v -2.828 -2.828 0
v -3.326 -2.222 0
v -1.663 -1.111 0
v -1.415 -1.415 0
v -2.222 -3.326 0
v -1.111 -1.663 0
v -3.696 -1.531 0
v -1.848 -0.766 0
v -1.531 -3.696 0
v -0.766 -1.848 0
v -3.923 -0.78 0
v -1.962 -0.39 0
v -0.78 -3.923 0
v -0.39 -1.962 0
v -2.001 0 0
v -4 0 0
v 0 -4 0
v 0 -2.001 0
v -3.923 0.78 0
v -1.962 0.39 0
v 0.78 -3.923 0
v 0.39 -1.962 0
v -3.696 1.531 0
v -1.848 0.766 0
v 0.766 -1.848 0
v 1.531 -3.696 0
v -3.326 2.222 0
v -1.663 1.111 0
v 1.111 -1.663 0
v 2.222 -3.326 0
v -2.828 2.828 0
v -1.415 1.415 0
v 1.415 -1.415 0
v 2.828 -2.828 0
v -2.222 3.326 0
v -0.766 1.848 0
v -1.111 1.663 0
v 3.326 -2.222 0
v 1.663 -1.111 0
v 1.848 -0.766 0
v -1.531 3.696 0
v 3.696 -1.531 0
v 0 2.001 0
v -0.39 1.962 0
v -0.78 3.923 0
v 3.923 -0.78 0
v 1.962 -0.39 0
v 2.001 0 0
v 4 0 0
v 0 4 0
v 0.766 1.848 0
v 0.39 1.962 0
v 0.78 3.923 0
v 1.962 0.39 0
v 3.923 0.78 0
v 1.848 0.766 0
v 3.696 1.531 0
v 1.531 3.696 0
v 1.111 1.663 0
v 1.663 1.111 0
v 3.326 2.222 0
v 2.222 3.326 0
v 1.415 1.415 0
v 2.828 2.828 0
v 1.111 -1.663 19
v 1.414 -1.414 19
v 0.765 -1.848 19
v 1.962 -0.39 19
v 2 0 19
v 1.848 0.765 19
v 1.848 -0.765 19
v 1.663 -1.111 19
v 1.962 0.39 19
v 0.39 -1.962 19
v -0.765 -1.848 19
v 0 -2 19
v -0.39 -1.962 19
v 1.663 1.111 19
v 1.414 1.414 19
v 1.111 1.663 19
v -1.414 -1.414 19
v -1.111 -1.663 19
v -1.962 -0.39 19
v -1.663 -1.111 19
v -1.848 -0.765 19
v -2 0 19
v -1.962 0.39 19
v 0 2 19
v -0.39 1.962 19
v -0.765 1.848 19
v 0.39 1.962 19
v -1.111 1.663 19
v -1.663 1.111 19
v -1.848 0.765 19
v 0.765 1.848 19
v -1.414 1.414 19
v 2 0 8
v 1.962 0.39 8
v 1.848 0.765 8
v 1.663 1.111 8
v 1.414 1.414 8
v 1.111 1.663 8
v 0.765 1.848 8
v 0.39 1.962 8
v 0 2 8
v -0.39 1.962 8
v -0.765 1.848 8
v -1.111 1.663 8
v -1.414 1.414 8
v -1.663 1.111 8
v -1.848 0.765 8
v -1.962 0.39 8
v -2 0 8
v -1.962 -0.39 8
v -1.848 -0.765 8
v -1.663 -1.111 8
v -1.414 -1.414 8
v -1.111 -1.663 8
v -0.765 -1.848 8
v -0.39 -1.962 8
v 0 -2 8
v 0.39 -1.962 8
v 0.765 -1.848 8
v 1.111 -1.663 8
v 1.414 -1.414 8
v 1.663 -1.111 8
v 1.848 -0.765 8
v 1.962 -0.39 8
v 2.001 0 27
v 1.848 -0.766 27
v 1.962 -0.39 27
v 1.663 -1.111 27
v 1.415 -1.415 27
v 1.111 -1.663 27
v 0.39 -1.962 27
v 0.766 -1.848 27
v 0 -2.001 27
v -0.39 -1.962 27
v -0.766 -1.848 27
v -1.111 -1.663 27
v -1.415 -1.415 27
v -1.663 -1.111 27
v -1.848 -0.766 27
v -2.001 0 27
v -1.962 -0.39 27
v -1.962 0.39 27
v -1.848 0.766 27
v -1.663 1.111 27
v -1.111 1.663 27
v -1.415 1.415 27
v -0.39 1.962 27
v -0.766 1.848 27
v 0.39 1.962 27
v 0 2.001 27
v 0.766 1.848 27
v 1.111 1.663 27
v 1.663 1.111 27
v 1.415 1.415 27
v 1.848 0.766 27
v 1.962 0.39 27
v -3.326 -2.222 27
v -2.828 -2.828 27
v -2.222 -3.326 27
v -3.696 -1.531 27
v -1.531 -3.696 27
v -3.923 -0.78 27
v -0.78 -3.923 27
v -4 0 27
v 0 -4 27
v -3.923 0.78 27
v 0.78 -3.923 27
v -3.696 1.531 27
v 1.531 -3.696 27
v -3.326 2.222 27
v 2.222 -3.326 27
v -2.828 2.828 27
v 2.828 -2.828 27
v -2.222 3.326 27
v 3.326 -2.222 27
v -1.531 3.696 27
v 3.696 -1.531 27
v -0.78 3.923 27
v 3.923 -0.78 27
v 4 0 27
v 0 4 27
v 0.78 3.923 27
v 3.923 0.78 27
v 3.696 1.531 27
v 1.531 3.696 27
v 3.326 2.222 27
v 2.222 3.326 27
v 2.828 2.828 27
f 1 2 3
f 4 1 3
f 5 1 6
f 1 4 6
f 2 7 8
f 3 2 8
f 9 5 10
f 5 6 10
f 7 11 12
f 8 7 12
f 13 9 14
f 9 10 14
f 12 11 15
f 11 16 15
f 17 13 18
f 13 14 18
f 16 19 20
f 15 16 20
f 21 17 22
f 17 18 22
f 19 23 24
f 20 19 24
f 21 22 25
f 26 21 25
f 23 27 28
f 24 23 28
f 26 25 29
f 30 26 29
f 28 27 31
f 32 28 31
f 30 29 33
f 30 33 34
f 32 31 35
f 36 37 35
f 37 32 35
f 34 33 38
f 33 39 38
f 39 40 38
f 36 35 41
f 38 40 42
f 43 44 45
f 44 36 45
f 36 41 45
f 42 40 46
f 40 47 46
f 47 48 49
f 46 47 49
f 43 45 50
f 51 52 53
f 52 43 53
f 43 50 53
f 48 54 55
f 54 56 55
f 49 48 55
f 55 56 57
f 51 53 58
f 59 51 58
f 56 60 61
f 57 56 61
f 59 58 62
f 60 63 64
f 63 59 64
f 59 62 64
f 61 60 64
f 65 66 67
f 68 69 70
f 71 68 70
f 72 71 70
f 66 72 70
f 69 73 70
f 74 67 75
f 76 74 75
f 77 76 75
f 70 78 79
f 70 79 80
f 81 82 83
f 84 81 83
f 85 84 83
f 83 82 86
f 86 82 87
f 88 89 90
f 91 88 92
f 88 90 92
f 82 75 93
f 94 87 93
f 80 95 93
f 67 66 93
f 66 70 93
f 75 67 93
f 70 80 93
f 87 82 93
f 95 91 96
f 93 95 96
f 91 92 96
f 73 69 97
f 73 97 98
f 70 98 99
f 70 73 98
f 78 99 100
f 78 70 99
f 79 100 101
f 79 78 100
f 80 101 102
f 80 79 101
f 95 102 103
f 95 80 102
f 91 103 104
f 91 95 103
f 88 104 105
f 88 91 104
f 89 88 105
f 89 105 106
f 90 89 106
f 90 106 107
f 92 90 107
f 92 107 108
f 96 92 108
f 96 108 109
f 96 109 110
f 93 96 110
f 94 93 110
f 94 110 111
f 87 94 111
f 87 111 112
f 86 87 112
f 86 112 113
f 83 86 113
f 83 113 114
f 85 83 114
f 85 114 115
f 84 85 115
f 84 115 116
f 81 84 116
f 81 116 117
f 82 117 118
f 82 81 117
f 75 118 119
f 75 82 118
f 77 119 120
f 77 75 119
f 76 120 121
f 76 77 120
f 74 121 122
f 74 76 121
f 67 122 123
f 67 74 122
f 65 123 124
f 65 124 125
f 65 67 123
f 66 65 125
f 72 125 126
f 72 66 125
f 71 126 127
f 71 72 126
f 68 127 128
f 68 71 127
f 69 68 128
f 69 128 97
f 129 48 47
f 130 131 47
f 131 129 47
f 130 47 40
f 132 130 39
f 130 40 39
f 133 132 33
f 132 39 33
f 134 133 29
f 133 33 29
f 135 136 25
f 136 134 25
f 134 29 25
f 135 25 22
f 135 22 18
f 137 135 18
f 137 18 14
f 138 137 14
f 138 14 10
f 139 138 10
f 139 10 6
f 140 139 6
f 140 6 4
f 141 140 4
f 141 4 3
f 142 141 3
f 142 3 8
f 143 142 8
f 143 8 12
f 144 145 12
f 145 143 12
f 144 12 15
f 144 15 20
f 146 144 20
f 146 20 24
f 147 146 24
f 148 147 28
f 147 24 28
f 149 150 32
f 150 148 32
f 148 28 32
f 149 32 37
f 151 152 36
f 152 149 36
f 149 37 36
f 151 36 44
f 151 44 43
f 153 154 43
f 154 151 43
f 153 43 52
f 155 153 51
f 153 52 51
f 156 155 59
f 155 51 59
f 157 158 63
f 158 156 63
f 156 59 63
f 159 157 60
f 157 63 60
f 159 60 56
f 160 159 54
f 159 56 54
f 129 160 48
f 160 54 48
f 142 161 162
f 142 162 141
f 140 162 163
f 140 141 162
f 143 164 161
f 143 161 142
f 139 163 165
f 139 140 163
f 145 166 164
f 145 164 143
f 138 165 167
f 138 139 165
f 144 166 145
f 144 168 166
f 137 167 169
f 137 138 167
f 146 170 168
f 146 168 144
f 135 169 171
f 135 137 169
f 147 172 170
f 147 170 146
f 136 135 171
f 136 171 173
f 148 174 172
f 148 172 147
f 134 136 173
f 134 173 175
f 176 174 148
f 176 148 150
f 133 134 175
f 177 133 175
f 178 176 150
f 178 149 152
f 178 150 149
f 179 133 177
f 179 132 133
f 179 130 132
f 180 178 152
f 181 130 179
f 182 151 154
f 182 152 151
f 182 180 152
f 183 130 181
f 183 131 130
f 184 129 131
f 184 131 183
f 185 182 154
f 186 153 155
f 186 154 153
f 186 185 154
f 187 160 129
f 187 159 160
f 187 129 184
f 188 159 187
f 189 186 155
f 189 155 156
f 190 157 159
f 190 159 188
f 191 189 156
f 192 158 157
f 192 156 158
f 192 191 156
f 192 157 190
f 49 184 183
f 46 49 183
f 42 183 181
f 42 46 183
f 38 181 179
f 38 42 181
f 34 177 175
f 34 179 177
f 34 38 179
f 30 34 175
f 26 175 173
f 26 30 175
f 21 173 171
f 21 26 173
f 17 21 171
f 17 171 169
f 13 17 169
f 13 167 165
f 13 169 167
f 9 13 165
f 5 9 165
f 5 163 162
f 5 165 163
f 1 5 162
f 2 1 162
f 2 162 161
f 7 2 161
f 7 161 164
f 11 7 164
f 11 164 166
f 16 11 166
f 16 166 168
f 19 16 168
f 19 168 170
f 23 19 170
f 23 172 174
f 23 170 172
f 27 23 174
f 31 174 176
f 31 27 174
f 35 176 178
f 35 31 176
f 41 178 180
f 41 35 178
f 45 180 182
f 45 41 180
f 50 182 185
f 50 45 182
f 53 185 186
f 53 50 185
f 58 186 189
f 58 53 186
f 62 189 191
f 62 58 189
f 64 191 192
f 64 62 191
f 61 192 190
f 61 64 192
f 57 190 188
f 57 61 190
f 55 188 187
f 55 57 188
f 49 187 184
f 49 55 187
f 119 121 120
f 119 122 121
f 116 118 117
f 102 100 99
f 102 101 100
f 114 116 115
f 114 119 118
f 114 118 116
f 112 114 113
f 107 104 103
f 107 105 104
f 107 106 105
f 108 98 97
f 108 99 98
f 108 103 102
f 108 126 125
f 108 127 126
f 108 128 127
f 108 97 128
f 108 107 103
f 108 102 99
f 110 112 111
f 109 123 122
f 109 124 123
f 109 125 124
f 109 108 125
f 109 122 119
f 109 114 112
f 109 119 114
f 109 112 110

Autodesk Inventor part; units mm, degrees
ref_plane "YZ Plane" through (0, 0, 0) normal (1, 0, 0) x (0, 1, 0)
ref_plane "XZ Plane" through (0, 0, 0) normal (0, 1, 0) x (-1, 0, 0)
sketch "スケッチ1" plane through (0, 0, 0) normal (0, 0, 1) x (1, 0, 0)
  circle A0 centre (0, 0) radius 4
  circle A1 centre (0, 0) radius 2.0005
  dimension "d0" = 8
  dimension "d1" = 4.001
extrude "押し出し1" add sketch "スケッチ1" along normal blind 27
sketch "スケッチ2" plane through (0, 0, 27) normal (0, 0, 1) x (1, 0, 0)
  circle A0 centre (0, 0) radius 2
  dimension "d4" = 4
extrude "押し出し2" add sketch "スケッチ2" against normal blind 25
hole "穴1" at (0, 0, 27) direction (0, 0, -1) diameter 4 depth 8 tip angle 118
hole "穴2" at (0, 0, 0) direction (0, 0, 1) diameter 4 depth 8 tip angle 118
ref_plane "作業平面1" through (0, 0, 8) normal (0, 0, -1) x (-1, 0, 0)
sketch "スケッチ3" plane through (0, 0, 8) normal (0, 0, -1) x (-1, 0, 0)
  circle A0 centre (0, 0) radius 2.0005 projected
  circle A1 centre (0, 0) radius 4 projected
  circle A2 centre (0, 0) radius 2 projected
sketch "スケッチ3 outline for 押し出し3" plane through (0, 0, 8) normal (0, 0, -1) x (-1, 0, 0)
  circle A0 centre (0, 0) radius 2
extrude "押し出し3" add sketch "スケッチ3 outline for 押し出し3" against normal blind 11
properties part number "スペーサーm4-27　簡易筒型" material "アルミニウム 2014-T4"
